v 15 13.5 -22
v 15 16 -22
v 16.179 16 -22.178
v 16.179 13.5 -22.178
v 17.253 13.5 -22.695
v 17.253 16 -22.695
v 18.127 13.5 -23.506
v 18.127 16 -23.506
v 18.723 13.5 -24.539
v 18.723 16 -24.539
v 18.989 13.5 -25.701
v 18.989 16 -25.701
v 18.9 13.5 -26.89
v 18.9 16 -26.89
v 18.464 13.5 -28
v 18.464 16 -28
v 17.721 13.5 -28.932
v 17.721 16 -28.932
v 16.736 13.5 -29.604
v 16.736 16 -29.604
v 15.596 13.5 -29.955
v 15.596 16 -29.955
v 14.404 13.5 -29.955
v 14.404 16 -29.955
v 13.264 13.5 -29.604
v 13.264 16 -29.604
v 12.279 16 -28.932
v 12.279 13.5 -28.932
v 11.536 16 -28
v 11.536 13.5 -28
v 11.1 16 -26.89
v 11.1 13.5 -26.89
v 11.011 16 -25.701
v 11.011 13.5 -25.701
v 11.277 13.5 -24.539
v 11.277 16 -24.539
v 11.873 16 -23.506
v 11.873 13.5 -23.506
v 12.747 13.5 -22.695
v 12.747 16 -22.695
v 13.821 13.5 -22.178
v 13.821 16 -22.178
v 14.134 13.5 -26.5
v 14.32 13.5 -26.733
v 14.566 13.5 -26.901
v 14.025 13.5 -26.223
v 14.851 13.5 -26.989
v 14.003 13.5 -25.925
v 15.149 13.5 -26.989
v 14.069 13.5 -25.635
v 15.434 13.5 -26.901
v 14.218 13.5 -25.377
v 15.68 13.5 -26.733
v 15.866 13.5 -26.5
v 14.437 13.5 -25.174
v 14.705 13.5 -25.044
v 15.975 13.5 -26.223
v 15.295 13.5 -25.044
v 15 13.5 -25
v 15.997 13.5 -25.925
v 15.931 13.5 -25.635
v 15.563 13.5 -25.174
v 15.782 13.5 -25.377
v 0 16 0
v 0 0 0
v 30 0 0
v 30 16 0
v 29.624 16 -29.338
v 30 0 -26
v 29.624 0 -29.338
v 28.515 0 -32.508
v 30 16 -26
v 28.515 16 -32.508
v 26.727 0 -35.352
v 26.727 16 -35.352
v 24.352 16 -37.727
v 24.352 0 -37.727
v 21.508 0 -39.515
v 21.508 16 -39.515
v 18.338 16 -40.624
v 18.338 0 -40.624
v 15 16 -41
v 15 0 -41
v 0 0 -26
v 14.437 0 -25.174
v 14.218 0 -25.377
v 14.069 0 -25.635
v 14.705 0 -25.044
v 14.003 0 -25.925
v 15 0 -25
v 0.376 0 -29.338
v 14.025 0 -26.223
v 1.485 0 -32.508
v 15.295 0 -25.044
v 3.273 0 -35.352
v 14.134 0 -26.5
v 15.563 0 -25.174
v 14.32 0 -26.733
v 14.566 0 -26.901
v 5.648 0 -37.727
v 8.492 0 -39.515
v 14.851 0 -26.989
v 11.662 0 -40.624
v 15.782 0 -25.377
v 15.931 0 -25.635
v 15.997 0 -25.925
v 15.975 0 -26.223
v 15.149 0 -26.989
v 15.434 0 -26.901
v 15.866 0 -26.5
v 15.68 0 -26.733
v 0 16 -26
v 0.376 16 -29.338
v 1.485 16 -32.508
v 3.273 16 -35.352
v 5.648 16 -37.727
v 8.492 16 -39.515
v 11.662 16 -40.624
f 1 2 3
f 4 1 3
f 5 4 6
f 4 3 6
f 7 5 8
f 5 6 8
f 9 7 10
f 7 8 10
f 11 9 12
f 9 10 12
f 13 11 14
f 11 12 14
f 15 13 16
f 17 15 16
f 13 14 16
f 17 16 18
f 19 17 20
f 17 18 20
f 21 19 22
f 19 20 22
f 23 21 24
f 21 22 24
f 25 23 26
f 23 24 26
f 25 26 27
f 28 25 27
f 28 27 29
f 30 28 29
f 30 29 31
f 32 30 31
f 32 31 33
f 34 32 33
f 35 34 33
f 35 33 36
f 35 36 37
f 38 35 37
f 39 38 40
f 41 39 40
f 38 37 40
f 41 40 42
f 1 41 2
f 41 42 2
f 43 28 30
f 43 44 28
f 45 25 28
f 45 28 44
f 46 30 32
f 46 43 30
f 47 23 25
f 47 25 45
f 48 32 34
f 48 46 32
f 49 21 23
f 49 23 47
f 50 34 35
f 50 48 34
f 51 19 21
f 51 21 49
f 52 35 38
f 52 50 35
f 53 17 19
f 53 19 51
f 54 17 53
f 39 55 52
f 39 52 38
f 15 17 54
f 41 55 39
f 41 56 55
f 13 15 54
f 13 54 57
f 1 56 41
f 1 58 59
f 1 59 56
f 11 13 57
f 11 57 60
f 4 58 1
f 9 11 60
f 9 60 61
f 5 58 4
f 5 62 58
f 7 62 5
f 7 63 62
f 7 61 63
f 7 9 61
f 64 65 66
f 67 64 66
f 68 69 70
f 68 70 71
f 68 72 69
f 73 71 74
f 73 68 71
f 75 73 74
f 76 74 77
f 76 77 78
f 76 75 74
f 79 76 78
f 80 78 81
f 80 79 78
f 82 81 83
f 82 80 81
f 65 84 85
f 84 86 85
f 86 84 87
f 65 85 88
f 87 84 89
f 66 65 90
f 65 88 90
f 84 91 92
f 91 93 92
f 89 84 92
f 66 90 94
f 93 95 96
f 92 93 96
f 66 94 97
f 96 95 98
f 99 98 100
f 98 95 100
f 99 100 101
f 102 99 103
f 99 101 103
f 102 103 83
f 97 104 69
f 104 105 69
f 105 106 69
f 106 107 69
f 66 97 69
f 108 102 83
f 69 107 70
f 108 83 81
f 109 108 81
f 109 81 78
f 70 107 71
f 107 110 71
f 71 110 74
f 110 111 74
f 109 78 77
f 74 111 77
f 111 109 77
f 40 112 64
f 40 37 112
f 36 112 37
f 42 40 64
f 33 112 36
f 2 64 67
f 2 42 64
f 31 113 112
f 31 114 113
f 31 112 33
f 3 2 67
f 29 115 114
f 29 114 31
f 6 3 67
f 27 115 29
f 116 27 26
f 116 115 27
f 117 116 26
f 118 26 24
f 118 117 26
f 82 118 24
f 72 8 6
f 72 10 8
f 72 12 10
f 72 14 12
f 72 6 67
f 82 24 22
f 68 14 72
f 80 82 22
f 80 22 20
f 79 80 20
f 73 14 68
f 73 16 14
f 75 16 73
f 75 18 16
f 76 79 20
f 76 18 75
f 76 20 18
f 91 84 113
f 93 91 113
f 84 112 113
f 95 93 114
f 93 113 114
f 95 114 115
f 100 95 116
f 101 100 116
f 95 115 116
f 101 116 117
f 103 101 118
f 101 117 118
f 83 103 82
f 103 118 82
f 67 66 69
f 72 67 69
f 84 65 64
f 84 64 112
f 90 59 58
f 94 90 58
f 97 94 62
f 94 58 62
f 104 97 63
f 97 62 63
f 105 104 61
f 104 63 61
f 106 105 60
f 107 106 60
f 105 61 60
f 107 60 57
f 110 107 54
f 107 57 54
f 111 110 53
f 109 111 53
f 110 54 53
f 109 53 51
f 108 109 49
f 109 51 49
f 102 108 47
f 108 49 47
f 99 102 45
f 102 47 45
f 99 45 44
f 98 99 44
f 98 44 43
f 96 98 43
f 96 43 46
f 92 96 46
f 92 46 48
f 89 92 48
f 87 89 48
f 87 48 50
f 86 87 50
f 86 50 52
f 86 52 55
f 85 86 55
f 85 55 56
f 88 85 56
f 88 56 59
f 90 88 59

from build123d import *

# Parameters (mm, degrees)
ESQUISSE1_W             = 30
ESQUISSE1_H             = 41
EXTRUSION1_DEPTH        = 16
CONG_1_R                = 15
ESQUISSE3_R             = 4
ENL_V_MAT_EXTRU_1_DEPTH = 2.5
ESQUISSE4_R             = 1
ENL_V_MAT_EXTRU_2_DEPTH = 53.566624392


with BuildPart() as part:
    # Esquisse1 → Extrusion1 (new body)
    with BuildSketch(Plane(origin=(0, 0, 0), x_dir=(1, 0, 0), z_dir=(0, 1, 0))):
        with Locations((15, 20.5)):
            Rectangle(ESQUISSE1_W, ESQUISSE1_H)
    extrude(amount=EXTRUSION1_DEPTH)

    # Congé1
    cong_1_edges = [part.edges().sort_by_distance(p)[0] for p in [
        (30, 8, -41),
        (0, 8, -41),
    ]]
    fillet(cong_1_edges, radius=CONG_1_R - 0.0001)  # a hair under: the kernel refuses the full size

    # Esquisse3 → Enlèv. mat.-Extru.1 (cut)
    with BuildSketch(Plane(origin=(0, 16, 0), x_dir=(1, 0, 0), z_dir=(0, 1, 0))):
        with Locations(Location((15, 26, 0), (0, 0, 270))):
            Circle(ESQUISSE3_R)
    extrude(amount=-ENL_V_MAT_EXTRU_1_DEPTH, mode=Mode.SUBTRACT)

    # Esquisse4 → Enlèv. mat.-Extru.2 (cut, through all)
    with BuildSketch(Plane(origin=(0, 13.5, 0), x_dir=(1, 0, 0), z_dir=(0, 1, 0))):
        with Locations(Location((15, 26, 0), (0, 0, 270))):
            Circle(ESQUISSE4_R)
    extrude(amount=-ENL_V_MAT_EXTRU_2_DEPTH, mode=Mode.SUBTRACT)


solid = part.part
